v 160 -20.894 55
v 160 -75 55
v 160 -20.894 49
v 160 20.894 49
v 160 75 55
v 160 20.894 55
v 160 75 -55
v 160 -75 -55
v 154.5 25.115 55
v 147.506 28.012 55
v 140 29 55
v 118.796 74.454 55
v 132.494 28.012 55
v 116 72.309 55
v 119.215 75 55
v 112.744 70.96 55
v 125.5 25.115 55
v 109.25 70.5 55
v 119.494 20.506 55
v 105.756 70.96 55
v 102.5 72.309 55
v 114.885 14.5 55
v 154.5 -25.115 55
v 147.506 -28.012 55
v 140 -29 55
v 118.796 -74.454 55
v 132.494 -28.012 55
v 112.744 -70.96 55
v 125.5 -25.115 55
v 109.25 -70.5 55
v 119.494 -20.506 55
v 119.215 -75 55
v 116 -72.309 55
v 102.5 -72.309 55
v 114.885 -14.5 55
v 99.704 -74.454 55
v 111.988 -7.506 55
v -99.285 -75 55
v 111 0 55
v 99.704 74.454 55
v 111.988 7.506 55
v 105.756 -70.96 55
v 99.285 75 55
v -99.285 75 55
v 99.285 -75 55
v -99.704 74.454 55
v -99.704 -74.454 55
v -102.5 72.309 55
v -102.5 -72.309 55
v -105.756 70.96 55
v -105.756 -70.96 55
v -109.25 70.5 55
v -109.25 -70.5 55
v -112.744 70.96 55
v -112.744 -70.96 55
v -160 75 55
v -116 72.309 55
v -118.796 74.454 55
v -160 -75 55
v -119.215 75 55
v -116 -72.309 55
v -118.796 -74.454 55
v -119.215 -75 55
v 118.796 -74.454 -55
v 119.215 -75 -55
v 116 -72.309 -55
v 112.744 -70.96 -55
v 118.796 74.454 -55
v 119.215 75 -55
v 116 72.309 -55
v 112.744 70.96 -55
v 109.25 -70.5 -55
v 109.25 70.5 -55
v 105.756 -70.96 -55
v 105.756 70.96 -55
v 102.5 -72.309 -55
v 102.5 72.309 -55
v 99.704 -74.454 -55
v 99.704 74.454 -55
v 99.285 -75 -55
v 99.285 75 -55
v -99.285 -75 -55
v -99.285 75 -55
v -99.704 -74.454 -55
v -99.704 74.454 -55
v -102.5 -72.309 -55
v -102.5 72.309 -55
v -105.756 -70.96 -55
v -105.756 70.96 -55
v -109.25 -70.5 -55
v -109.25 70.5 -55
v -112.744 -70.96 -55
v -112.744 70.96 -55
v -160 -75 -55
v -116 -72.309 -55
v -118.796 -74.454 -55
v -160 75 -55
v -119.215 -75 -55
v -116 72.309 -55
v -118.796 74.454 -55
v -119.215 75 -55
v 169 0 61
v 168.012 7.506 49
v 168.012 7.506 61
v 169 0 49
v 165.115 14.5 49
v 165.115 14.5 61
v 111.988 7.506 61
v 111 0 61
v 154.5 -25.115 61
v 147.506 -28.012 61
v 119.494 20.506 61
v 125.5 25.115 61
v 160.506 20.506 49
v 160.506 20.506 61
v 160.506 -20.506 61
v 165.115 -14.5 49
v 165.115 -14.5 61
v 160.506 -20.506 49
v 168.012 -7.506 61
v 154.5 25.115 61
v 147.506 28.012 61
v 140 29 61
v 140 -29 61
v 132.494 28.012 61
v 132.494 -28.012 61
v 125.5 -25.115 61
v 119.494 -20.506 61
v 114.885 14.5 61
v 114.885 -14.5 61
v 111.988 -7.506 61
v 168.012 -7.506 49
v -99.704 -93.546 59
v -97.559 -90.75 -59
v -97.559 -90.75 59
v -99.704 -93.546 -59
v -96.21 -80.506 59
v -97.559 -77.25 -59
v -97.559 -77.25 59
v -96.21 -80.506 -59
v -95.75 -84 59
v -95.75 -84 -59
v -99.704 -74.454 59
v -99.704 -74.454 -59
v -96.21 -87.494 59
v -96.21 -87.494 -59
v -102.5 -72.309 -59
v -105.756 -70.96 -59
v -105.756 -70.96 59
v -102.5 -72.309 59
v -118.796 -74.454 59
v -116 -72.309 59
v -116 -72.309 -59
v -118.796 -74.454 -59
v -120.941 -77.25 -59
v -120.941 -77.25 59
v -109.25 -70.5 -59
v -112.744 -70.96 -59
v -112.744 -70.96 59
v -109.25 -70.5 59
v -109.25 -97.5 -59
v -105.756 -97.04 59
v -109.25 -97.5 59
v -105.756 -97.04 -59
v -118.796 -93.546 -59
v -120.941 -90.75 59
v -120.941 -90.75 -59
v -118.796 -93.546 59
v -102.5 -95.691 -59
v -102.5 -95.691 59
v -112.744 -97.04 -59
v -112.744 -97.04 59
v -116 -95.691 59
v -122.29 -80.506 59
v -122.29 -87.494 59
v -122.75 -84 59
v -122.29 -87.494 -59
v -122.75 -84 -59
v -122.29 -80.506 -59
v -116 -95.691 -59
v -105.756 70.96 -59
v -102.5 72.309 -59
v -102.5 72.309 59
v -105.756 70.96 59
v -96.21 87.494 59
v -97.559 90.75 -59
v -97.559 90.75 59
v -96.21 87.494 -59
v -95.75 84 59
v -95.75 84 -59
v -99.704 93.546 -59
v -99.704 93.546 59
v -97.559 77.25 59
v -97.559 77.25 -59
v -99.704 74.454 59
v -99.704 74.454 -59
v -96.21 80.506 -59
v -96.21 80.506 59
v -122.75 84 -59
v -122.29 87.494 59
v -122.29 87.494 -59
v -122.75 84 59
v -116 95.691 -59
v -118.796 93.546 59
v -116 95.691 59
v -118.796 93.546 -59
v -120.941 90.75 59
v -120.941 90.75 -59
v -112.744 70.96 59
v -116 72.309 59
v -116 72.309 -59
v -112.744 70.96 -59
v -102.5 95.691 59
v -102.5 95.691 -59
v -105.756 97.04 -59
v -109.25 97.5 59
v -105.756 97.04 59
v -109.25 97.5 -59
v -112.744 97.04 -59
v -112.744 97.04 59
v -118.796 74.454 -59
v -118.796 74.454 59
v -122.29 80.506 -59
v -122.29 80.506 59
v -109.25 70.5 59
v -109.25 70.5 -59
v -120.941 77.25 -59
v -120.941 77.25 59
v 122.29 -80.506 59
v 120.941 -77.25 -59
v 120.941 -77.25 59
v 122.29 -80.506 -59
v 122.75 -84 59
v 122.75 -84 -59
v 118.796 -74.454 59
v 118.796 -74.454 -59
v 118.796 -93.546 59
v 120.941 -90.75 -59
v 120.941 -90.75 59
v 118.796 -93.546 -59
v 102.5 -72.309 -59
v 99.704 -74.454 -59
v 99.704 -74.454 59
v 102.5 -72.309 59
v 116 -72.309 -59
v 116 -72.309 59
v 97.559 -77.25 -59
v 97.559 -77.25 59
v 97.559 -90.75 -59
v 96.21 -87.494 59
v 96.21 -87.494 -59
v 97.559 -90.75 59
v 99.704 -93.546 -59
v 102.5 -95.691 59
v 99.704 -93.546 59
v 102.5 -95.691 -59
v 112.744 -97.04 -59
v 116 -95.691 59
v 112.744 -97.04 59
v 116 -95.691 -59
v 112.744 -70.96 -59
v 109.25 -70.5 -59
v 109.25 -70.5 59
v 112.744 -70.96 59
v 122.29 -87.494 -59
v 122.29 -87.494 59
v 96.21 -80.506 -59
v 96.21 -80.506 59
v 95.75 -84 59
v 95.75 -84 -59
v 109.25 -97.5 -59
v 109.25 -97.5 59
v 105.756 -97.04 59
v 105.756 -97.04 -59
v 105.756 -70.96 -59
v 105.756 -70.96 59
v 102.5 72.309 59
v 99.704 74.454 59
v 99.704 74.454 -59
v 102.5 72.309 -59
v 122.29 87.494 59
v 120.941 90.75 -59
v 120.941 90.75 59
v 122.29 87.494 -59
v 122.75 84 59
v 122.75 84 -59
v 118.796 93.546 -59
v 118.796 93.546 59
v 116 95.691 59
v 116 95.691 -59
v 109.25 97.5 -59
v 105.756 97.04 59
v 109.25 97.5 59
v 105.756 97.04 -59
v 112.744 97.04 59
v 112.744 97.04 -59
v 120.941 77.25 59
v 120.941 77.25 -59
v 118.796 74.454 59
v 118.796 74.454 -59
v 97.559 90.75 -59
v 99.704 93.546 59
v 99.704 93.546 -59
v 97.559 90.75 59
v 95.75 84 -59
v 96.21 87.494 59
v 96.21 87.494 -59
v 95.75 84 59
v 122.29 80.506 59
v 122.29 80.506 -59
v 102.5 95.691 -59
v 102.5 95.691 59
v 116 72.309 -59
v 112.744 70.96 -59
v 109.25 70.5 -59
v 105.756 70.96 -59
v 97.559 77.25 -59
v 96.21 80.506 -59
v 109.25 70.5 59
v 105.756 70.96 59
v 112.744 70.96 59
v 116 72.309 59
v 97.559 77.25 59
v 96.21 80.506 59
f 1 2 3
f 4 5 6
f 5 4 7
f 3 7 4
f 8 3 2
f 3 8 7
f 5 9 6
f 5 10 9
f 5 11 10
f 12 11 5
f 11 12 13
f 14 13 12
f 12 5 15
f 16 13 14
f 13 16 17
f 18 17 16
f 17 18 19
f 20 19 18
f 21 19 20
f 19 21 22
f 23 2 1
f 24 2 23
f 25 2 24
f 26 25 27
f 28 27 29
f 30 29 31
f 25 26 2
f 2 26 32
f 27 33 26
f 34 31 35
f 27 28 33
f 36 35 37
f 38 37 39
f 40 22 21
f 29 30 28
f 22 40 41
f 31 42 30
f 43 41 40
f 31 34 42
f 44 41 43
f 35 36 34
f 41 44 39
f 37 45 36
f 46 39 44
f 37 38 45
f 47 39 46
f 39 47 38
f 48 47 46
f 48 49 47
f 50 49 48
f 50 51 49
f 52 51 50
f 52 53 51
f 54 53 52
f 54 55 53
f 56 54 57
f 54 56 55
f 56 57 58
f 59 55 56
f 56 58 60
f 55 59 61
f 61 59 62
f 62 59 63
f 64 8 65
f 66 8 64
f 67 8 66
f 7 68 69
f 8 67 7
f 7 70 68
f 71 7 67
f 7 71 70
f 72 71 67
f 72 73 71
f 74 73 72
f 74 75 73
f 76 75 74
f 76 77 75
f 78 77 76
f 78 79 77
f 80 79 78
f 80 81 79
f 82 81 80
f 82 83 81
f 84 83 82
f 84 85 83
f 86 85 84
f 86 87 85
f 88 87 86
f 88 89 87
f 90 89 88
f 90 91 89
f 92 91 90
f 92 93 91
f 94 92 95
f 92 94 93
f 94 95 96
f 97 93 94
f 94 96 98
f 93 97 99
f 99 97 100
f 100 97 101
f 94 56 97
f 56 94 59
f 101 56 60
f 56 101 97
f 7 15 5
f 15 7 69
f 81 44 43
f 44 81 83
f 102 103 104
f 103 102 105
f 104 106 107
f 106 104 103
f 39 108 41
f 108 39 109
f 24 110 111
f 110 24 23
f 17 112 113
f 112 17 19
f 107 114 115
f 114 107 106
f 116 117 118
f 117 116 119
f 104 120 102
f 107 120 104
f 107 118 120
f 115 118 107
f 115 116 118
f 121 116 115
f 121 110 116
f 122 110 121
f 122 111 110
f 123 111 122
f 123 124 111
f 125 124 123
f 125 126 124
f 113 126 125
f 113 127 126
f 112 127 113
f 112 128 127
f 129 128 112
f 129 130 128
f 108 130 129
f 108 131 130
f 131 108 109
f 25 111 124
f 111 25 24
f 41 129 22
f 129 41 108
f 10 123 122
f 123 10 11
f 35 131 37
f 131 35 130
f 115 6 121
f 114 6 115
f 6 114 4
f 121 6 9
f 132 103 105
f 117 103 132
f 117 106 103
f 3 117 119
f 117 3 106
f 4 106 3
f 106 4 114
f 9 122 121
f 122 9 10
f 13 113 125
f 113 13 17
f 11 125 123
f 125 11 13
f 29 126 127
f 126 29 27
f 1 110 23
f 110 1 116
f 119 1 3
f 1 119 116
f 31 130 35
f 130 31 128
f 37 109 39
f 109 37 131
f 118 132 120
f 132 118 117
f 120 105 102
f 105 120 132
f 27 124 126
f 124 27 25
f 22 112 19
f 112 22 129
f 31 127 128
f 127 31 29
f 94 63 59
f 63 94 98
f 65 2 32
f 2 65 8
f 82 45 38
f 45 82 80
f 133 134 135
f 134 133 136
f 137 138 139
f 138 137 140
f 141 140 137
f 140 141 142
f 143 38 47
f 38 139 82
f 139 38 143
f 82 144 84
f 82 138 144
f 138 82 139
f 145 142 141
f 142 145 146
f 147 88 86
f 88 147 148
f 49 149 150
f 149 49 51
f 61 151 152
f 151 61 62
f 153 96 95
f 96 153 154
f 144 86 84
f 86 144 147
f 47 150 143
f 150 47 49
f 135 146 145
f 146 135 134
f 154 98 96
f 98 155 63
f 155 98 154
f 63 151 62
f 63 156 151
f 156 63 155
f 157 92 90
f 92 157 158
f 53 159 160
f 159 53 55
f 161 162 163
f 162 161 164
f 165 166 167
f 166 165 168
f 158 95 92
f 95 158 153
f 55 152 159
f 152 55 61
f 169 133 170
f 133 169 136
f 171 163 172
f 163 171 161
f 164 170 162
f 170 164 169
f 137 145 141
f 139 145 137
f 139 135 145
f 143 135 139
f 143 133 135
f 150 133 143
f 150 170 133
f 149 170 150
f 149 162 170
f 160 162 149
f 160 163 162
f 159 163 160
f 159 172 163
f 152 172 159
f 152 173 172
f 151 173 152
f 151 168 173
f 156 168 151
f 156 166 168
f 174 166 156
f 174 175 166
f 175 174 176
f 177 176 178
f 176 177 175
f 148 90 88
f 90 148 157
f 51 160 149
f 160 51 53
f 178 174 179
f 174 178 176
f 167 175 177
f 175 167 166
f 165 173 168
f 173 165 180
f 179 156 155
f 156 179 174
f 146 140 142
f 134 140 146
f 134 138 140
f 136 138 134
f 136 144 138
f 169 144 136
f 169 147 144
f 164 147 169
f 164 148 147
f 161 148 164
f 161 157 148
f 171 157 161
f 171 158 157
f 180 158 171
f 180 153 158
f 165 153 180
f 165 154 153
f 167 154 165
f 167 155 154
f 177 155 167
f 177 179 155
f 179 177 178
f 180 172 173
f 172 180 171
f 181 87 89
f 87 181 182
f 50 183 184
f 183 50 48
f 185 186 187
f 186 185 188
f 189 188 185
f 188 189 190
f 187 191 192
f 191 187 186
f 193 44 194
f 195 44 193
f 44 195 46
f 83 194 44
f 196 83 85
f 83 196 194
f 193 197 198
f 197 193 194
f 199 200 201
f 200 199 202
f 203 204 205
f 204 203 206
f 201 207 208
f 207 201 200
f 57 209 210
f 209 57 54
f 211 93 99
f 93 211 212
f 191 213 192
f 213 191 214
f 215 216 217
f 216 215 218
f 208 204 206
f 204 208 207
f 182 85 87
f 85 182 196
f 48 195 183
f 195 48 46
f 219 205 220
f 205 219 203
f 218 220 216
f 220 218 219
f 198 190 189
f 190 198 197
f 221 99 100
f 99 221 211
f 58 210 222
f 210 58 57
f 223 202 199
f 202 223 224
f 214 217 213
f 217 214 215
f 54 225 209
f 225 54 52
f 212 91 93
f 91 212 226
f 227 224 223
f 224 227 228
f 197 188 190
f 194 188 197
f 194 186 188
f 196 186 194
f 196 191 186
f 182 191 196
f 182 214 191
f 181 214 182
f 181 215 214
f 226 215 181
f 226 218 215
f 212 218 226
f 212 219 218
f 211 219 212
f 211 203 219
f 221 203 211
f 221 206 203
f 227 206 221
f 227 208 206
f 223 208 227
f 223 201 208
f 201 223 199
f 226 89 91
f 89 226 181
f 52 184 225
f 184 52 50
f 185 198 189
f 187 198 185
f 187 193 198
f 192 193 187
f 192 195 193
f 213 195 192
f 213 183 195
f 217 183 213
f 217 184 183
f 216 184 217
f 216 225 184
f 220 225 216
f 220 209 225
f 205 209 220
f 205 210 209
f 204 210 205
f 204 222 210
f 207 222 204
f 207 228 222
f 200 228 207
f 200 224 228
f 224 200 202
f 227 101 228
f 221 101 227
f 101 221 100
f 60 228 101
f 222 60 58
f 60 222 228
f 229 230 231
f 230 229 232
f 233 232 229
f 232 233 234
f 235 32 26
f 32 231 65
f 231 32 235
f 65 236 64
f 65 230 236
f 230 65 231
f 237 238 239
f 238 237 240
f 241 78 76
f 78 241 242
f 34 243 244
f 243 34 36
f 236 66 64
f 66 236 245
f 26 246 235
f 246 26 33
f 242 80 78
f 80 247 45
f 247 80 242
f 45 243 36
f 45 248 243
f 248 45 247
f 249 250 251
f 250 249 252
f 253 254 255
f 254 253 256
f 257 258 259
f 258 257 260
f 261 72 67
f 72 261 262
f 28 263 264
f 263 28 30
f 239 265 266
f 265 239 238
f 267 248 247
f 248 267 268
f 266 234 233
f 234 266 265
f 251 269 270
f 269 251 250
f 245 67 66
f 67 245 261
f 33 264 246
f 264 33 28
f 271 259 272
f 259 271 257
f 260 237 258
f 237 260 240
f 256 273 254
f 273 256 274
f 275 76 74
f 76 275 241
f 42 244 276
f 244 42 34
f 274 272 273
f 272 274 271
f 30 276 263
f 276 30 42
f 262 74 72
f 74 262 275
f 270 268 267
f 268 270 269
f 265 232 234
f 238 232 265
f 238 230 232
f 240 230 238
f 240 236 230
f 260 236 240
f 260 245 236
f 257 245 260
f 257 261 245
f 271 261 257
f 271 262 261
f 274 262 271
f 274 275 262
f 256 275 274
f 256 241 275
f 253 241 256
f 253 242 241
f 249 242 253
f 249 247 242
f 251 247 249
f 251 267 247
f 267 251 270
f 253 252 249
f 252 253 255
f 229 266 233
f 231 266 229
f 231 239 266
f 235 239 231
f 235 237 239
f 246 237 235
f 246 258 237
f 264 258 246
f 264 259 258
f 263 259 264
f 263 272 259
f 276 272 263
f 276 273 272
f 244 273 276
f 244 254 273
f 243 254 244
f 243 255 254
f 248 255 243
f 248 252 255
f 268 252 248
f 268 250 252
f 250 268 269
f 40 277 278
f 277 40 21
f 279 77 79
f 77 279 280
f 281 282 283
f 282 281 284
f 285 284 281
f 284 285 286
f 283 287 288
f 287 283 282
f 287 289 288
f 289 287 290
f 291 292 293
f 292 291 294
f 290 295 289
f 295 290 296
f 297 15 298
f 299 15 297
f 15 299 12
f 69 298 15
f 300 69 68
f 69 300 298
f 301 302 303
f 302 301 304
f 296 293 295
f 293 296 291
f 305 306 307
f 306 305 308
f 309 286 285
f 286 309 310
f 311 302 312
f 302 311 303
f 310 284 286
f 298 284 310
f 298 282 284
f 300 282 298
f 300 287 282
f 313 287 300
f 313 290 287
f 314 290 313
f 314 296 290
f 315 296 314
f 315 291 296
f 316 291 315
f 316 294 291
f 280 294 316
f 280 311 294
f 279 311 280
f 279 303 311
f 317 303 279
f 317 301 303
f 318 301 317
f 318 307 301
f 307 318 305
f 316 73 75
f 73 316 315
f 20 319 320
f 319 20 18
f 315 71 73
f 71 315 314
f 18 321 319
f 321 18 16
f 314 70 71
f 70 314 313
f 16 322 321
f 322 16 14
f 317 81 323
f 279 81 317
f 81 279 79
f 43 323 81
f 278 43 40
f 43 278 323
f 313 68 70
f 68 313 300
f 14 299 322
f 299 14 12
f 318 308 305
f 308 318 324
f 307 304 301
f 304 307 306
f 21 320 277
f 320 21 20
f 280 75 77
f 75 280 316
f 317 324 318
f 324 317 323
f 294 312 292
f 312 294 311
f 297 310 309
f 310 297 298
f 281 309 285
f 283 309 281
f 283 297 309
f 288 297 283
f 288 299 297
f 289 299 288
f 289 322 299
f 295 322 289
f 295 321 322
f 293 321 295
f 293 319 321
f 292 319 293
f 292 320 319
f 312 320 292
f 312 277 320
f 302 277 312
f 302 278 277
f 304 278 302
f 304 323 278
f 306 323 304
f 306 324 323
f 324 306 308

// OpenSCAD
// file: ori_params.scad
// ori_params.scad — Ori Robot Dog master parameters (mirrors Parameters/master_parameters.py)
//
// NOTE: These OpenSCAD files are a parametric, human/AI-READABLE summary of Ori.
// The authoritative, higher-fidelity manufactured geometry is the STEP files in the
// CAD_STEP/ folder of this package (NOT here, but still present). Use those for printing.
//
// All dims in millimetres. These are representative values for a readable/viewable model;
// the Python/CadQuery source (Source/) and STEP exports are the source of truth.

// Robot scale
overall_height = 364;
hip_height     = 300;
ground_clear   = 190;

// Stance
stance_length  = 437;
stance_width   = 168;

// Legs (upper = lower = 175)
link_len = 175;
link_w   = 34;
link_t   = 24;
foot_h   = 40;

// Torso (split at x=0 into two halves)
torso_len = 320;
torso_w   = 150;
torso_h   = 110;

// Head
head_d   = 90;

// Arm (6-DOF), mounted front +X
arm_base_x = 140;
arm_yaw_h  = 30;
arm_upper  = 70;
arm_fore   = 60;
arm_wrist  = 28;
grip_r     = 17;   // coupler radius
finger_len = 30;

// Servo (Hiwonder HTD-45H) envelope
servo_l = 51.1;
servo_w = 20.14;
servo_h = 40;

// Bearing (626ZZ)
bearing_od = 19;
bearing_id = 6;
bearing_w  = 6;
// main file
// ori_torso.scad — splittable structural chassis, hips, battery bay, arm port.
// Mirrors CAD/Torso/torso.py. Readable summary, not the manufactured part.
include <ori_params.scad>

module torso_half(side=+1) {
  color("steelblue") {
    translate([0, side*torso_w/4, 0])
      cube([torso_len, torso_w/2, torso_h], center=true);
  }
  // arm port (front +X face)
  translate([arm_base_x,0,torso_h/2])
    color("gray") cylinder(r=29, h=12, center=true, $fn=24);
}

module torso() {
  torso_half(+1);
  torso_half(-1);
  // hip bulkheads (4 corners)
  for (sx=[-1,1], sy=[-1,1])
    translate([sx*stance_length/4, sy*stance_width/2, 0])
      color("gray") cylinder(r=bearing_od/2+4, h=torso_h+8, center=true, $fn=24);
}

torso();
